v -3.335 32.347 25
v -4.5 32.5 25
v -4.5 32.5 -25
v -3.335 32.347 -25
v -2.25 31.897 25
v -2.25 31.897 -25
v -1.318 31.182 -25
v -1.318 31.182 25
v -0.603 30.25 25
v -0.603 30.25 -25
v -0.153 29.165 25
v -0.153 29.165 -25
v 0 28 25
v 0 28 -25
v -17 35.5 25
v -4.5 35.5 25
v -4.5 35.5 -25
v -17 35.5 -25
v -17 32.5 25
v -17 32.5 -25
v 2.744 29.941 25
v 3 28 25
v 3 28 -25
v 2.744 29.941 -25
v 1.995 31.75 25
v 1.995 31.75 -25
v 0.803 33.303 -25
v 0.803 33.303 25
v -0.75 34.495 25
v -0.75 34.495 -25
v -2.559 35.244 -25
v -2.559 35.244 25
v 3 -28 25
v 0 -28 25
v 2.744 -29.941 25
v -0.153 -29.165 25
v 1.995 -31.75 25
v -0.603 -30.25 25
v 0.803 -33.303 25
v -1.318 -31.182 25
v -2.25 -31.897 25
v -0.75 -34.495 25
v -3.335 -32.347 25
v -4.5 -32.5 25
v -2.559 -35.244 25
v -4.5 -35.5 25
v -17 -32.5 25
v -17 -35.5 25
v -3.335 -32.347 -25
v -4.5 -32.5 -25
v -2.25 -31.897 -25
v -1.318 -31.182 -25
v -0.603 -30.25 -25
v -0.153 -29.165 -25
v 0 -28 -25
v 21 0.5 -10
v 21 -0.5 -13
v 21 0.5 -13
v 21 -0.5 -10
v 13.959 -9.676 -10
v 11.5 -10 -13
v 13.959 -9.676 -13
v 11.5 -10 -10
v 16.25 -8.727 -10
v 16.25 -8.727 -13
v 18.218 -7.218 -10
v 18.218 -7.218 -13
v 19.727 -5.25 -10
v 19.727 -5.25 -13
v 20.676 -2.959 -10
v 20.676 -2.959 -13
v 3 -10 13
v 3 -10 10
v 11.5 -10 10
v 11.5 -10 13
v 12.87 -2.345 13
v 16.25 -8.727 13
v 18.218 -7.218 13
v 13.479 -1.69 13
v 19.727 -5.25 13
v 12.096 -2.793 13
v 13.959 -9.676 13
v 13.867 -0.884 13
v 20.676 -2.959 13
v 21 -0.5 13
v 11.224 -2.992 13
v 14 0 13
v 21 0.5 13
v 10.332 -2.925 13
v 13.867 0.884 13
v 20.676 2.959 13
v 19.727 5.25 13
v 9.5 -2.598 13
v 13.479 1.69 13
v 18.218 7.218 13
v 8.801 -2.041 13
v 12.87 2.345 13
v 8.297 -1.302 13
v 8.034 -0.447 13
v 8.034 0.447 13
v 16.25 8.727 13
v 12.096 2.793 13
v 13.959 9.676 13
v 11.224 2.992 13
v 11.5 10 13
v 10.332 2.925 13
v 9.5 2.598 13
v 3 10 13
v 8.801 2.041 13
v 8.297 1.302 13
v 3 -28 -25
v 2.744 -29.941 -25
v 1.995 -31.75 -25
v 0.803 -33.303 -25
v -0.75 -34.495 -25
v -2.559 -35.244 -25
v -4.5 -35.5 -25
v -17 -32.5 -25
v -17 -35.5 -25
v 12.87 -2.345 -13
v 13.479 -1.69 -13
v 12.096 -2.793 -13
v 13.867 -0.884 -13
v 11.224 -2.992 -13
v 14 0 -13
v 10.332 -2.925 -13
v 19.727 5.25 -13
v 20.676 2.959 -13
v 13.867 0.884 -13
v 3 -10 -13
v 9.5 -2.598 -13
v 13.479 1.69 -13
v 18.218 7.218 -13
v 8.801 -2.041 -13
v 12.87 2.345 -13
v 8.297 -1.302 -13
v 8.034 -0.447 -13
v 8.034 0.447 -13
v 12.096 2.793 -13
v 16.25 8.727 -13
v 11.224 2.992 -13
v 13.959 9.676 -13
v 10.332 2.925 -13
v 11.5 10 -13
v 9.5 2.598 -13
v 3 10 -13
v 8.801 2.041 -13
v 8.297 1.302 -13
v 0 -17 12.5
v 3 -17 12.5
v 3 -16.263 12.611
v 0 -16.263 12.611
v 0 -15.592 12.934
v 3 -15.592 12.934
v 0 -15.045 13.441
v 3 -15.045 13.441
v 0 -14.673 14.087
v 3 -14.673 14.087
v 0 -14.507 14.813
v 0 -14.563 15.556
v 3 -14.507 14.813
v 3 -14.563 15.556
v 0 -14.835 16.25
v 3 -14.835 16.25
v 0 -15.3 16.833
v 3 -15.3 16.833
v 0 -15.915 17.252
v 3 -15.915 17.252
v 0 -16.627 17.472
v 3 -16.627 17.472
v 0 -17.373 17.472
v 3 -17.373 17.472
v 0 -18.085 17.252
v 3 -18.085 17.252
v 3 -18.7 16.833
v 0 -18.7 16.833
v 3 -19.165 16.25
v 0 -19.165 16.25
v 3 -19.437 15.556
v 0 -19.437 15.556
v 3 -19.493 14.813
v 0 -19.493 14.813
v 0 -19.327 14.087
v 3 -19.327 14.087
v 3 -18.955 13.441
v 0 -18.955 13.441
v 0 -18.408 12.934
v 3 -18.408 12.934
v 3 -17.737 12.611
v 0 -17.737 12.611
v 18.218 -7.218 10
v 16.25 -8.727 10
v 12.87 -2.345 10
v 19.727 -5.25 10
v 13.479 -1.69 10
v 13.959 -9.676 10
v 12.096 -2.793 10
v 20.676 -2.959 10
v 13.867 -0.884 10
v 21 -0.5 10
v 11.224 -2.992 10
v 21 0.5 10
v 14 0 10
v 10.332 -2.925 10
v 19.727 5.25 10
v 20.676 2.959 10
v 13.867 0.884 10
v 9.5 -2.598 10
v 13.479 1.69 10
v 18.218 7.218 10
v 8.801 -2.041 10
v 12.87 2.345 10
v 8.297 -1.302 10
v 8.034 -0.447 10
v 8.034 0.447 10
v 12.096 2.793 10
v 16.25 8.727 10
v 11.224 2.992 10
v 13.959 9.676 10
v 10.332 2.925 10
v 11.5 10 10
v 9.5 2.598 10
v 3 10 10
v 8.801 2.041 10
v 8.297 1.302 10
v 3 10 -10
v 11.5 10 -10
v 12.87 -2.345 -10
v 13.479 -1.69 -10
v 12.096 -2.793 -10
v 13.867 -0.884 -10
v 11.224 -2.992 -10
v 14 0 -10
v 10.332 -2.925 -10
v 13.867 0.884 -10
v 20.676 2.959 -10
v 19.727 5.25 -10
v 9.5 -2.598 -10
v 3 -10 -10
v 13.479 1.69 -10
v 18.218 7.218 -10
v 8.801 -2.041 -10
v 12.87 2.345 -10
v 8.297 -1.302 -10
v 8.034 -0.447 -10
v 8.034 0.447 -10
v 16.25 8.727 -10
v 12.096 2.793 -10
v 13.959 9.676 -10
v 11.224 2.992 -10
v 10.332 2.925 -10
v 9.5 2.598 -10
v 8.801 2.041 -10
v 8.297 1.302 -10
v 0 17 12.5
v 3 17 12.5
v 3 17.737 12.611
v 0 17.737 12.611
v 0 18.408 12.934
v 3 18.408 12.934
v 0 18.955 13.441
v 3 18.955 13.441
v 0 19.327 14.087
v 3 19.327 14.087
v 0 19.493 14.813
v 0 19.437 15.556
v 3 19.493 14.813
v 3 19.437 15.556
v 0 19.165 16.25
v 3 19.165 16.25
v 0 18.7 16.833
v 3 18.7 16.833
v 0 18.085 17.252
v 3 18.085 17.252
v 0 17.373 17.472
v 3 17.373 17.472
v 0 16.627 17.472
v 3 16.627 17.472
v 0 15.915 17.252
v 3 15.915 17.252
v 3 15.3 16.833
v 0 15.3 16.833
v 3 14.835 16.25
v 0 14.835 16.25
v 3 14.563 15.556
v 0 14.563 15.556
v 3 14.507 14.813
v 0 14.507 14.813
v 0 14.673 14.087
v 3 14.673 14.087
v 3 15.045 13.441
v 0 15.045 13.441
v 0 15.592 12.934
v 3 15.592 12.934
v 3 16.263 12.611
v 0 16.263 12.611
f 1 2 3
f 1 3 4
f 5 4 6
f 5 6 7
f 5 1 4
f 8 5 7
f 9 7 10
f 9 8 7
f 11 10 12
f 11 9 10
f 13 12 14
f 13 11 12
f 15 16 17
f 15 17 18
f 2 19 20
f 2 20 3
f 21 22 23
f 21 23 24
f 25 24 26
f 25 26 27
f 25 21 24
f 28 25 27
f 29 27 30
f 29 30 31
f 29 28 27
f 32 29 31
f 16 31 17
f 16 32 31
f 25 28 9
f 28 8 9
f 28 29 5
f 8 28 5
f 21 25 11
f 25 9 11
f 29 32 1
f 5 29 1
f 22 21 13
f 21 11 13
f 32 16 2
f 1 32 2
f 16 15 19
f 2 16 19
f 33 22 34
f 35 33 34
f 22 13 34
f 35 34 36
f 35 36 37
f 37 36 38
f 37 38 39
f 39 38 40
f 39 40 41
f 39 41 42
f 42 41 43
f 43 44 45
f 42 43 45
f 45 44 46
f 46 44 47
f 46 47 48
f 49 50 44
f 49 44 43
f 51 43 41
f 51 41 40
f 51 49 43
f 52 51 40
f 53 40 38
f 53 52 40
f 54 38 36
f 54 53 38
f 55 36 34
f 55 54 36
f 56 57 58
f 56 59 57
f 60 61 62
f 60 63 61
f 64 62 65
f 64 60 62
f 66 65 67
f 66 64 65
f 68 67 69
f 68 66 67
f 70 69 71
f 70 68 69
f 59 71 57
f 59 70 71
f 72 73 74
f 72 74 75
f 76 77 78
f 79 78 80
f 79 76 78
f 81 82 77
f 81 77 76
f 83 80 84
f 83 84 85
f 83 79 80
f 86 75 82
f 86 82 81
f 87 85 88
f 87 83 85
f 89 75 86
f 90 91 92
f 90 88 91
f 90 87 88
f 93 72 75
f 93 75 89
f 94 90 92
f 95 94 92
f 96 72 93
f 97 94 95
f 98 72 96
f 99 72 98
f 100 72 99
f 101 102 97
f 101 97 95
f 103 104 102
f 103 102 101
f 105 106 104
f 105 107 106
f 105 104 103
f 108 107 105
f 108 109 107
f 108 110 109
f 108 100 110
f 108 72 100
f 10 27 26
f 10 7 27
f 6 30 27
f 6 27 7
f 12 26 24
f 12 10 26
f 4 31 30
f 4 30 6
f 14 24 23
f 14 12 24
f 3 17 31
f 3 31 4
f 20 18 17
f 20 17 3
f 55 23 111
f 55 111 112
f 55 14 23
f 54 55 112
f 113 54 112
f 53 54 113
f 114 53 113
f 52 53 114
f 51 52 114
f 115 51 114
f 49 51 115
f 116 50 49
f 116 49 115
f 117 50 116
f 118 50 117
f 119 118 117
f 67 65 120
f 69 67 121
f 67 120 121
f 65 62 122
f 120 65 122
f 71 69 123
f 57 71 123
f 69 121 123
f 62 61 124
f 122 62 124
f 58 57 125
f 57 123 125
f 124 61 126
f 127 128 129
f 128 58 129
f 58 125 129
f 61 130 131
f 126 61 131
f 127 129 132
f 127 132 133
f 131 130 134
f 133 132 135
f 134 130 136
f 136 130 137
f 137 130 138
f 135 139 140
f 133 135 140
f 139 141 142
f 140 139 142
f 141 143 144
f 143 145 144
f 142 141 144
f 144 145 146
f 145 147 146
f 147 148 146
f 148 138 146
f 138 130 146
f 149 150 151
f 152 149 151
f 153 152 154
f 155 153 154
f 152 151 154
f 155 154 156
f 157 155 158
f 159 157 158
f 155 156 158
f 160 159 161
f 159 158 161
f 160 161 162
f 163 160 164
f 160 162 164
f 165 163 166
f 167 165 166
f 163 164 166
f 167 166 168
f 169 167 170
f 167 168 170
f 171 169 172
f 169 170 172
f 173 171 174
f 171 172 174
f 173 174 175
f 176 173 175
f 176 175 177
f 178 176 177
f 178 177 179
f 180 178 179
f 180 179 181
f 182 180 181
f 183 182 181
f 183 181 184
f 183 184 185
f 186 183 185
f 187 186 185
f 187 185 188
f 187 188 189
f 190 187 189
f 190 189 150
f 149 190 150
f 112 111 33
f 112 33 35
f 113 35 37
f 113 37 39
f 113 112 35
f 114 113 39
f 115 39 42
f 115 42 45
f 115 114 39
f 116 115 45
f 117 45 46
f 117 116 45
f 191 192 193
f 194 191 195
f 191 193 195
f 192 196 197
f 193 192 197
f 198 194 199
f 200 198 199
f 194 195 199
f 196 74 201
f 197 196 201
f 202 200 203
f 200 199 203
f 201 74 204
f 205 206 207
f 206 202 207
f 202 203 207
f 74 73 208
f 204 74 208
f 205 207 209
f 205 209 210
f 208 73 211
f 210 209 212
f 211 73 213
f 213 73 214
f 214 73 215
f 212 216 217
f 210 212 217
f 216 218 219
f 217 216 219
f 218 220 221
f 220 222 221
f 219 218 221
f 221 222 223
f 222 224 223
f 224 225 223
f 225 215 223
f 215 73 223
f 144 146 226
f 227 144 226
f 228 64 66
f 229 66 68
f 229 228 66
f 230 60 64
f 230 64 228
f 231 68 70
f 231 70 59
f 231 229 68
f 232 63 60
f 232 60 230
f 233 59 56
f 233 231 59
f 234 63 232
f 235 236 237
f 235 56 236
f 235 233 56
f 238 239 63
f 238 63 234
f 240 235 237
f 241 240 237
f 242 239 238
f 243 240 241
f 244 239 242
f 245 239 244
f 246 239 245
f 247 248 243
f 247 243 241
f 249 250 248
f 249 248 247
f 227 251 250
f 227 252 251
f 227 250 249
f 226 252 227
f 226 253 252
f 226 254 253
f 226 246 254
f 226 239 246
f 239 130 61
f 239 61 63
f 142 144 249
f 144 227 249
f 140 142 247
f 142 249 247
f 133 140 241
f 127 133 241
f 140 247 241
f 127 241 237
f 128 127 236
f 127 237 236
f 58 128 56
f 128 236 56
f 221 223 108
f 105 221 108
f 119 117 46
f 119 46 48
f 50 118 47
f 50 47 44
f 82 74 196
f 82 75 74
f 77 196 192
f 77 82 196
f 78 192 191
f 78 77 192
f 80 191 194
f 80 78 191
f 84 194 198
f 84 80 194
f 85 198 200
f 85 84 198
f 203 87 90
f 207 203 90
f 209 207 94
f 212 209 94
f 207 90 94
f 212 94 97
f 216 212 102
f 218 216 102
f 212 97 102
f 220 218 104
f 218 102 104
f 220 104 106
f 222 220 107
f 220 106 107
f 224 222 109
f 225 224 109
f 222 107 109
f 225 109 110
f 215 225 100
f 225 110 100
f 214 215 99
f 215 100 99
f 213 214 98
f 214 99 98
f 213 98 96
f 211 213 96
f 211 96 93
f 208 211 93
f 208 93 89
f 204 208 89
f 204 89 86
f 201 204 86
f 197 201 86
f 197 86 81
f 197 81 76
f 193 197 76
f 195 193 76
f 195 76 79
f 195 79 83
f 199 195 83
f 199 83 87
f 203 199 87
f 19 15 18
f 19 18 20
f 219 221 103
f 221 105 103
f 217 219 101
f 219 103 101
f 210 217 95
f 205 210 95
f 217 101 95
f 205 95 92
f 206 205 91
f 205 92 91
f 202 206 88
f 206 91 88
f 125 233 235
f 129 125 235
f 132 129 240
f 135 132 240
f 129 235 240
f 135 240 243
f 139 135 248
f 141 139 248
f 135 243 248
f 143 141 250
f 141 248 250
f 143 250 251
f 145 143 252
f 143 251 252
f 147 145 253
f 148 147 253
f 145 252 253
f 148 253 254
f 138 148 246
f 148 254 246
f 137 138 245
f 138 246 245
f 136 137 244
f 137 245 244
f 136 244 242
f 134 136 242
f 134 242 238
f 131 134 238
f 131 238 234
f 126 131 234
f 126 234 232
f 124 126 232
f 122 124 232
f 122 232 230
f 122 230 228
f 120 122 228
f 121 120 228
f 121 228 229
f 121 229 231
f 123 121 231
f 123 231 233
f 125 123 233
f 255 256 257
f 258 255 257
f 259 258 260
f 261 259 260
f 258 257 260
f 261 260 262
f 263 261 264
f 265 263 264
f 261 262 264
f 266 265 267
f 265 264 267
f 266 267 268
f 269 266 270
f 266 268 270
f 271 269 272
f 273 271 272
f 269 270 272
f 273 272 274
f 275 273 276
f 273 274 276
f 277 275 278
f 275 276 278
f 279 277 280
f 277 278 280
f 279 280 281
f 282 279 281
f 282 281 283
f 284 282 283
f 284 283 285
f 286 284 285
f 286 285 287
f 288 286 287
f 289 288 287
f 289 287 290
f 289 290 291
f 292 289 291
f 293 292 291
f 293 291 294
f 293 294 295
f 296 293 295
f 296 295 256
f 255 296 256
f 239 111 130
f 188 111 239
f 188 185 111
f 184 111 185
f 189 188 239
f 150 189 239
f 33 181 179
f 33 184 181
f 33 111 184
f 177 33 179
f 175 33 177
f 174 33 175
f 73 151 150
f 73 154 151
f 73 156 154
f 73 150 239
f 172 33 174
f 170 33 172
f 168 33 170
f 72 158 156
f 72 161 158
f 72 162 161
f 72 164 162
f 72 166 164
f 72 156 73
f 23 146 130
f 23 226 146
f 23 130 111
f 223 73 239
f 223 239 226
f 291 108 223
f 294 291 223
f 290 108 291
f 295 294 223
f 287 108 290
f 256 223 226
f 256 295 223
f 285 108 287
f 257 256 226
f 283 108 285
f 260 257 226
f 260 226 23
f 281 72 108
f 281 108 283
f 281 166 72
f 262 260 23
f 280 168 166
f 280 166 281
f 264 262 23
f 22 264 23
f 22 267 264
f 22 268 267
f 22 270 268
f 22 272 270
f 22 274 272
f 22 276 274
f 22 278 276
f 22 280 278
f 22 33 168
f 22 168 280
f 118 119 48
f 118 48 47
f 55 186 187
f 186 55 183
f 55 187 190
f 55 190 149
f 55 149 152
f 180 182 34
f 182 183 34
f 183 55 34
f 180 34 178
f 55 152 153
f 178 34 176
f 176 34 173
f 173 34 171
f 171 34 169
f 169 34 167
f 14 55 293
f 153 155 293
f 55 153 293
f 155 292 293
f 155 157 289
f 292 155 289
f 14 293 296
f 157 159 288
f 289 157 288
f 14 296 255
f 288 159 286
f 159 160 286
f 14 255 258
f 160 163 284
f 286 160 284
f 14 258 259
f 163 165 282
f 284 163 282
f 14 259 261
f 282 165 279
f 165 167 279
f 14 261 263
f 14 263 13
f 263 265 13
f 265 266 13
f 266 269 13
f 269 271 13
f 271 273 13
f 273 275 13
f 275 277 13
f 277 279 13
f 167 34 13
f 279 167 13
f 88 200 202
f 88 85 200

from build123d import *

# Parameters (mm, degrees)
SKETCH1_W                      = 65
SKETCH1_H                      = 50
BASE_FLANGE1_DEPTH             = 3
EDGE_FLANGE1_STRIP_W           = 21
EDGE_FLANGE1_STRIP_H           = 3
EDGE_FLANGE1_STRIP_CUT_DEPTH   = 50
EDGE_FLANGE1_STRIP_2_W         = 21
EDGE_FLANGE1_STRIP_2_H         = 3
EDGE_FLANGE1_STRIP_CUT_2_DEPTH = 50
EDGE_FLANGE1_DEPTH             = 50
EDGE_FLANGE1_BEND_DEPTH        = 50
SKETCH13_R                     = 2.5
CUT_EXTRUDE1_DEPTH             = 10
SKETCH14_W                     = 20
SKETCH14_H                     = 3
BOSS_EXTRUDE1_DEPTH            = 18
FILLET1_R                      = 9.5
SKETCH15_R                     = 3
CUT_EXTRUDE2_DEPTH             = 31


# Sheet-metal steps are written as plain solids
with BuildPart() as part:
    # Sketch1 → Base-Flange1 (new body)
    with BuildSketch(Plane.YZ):
        Rectangle(SKETCH1_W, SKETCH1_H)
    extrude(amount=BASE_FLANGE1_DEPTH)

    # Edge-Flange1 strip (across the edge) → Edge-Flange1 strip cut (cut)
    with BuildSketch(Plane(origin=(0, 32.5, 25), x_dir=(0, -1, 0), z_dir=(0, 0, -1))):
        with Locations((-6, -1.5)):
            Rectangle(EDGE_FLANGE1_STRIP_W, EDGE_FLANGE1_STRIP_H)
    extrude(amount=EDGE_FLANGE1_STRIP_CUT_DEPTH, mode=Mode.SUBTRACT)

    # Edge-Flange1 strip 2 (across the edge) → Edge-Flange1 strip cut 2 (cut)
    with BuildSketch(Plane(origin=(0, -32.5, -25), x_dir=(0, 1, 0), z_dir=(0, 0, 1))):
        with Locations((-6, -1.5)):
            Rectangle(EDGE_FLANGE1_STRIP_2_W, EDGE_FLANGE1_STRIP_2_H)
    extrude(amount=EDGE_FLANGE1_STRIP_CUT_2_DEPTH, mode=Mode.SUBTRACT)

    # Edge-Flange1 section (across the edge) → Edge-Flange1 (add)
    with BuildSketch(Plane(origin=(0, 32.5, 25), x_dir=(0, -1, 0), z_dir=(0, 0, -1))):
        with BuildLine():
            Line((-3, 4.5), (-3, 17))
            Line((-3, 17), (0, 17))
            Line((0, 17), (0, 4.5))
            ThreePointArc((0, 4.5), (1.318019485, 1.318019485), (4.5, 0))
            Line((4.5, 0), (4.5, -3))
            ThreePointArc((4.5, -3), (-0.803300859, -0.803300859), (-3, 4.5))
        make_face()
    extrude(amount=EDGE_FLANGE1_DEPTH)

    # Edge-Flange1 section 2 (across the edge) → Edge-Flange1 bend (add)
    with BuildSketch(Plane(origin=(0, -32.5, -25), x_dir=(0, 1, 0), z_dir=(0, 0, 1))):
        with BuildLine():
            Line((-3, 4.5), (-3, 17))
            Line((-3, 17), (0, 17))
            Line((0, 17), (0, 4.5))
            ThreePointArc((0, 4.5), (1.318019485, 1.318019485), (4.5, 0))
            Line((4.5, 0), (4.5, -3))
            ThreePointArc((4.5, -3), (-0.803300859, -0.803300859), (-3, 4.5))
        make_face()
    extrude(amount=EDGE_FLANGE1_BEND_DEPTH)

    # Sketch13 → Cut-Extrude1 (cut)
    with BuildSketch(Plane.YZ.offset(3)):
        with Locations(Location((-17, 15, 0), (0, 0, 270))):
            Circle(SKETCH13_R)
        with Locations(Location((17, 15, 0), (0, 0, 270))):
            Circle(SKETCH13_R)
    extrude(amount=-CUT_EXTRUDE1_DEPTH, mode=Mode.SUBTRACT)

    # Sketch14 → Boss-Extrude1 (add)
    with BuildSketch(Plane.YZ.offset(3)):
        with Locations((0, 11.5)):
            Rectangle(SKETCH14_W, SKETCH14_H)
        with Locations((0, -11.5)):
            Rectangle(SKETCH14_W, SKETCH14_H)
    extrude(amount=BOSS_EXTRUDE1_DEPTH)

    # Fillet1
    fillet1_edges = [part.edges().sort_by_distance(p)[0] for p in [
        (21, -10, 11.5),
        (21, 10, 11.5),
        (21, -10, -11.5),
        (21, 10, -11.5),
    ]]
    fillet(fillet1_edges, radius=FILLET1_R)

    # Sketch15 → Cut-Extrude2 (cut)
    with BuildSketch(Plane.XY.offset(13)):
        with Locations((11, 0)):
            Circle(SKETCH15_R)
    extrude(amount=-CUT_EXTRUDE2_DEPTH, mode=Mode.SUBTRACT)


solid = part.part
